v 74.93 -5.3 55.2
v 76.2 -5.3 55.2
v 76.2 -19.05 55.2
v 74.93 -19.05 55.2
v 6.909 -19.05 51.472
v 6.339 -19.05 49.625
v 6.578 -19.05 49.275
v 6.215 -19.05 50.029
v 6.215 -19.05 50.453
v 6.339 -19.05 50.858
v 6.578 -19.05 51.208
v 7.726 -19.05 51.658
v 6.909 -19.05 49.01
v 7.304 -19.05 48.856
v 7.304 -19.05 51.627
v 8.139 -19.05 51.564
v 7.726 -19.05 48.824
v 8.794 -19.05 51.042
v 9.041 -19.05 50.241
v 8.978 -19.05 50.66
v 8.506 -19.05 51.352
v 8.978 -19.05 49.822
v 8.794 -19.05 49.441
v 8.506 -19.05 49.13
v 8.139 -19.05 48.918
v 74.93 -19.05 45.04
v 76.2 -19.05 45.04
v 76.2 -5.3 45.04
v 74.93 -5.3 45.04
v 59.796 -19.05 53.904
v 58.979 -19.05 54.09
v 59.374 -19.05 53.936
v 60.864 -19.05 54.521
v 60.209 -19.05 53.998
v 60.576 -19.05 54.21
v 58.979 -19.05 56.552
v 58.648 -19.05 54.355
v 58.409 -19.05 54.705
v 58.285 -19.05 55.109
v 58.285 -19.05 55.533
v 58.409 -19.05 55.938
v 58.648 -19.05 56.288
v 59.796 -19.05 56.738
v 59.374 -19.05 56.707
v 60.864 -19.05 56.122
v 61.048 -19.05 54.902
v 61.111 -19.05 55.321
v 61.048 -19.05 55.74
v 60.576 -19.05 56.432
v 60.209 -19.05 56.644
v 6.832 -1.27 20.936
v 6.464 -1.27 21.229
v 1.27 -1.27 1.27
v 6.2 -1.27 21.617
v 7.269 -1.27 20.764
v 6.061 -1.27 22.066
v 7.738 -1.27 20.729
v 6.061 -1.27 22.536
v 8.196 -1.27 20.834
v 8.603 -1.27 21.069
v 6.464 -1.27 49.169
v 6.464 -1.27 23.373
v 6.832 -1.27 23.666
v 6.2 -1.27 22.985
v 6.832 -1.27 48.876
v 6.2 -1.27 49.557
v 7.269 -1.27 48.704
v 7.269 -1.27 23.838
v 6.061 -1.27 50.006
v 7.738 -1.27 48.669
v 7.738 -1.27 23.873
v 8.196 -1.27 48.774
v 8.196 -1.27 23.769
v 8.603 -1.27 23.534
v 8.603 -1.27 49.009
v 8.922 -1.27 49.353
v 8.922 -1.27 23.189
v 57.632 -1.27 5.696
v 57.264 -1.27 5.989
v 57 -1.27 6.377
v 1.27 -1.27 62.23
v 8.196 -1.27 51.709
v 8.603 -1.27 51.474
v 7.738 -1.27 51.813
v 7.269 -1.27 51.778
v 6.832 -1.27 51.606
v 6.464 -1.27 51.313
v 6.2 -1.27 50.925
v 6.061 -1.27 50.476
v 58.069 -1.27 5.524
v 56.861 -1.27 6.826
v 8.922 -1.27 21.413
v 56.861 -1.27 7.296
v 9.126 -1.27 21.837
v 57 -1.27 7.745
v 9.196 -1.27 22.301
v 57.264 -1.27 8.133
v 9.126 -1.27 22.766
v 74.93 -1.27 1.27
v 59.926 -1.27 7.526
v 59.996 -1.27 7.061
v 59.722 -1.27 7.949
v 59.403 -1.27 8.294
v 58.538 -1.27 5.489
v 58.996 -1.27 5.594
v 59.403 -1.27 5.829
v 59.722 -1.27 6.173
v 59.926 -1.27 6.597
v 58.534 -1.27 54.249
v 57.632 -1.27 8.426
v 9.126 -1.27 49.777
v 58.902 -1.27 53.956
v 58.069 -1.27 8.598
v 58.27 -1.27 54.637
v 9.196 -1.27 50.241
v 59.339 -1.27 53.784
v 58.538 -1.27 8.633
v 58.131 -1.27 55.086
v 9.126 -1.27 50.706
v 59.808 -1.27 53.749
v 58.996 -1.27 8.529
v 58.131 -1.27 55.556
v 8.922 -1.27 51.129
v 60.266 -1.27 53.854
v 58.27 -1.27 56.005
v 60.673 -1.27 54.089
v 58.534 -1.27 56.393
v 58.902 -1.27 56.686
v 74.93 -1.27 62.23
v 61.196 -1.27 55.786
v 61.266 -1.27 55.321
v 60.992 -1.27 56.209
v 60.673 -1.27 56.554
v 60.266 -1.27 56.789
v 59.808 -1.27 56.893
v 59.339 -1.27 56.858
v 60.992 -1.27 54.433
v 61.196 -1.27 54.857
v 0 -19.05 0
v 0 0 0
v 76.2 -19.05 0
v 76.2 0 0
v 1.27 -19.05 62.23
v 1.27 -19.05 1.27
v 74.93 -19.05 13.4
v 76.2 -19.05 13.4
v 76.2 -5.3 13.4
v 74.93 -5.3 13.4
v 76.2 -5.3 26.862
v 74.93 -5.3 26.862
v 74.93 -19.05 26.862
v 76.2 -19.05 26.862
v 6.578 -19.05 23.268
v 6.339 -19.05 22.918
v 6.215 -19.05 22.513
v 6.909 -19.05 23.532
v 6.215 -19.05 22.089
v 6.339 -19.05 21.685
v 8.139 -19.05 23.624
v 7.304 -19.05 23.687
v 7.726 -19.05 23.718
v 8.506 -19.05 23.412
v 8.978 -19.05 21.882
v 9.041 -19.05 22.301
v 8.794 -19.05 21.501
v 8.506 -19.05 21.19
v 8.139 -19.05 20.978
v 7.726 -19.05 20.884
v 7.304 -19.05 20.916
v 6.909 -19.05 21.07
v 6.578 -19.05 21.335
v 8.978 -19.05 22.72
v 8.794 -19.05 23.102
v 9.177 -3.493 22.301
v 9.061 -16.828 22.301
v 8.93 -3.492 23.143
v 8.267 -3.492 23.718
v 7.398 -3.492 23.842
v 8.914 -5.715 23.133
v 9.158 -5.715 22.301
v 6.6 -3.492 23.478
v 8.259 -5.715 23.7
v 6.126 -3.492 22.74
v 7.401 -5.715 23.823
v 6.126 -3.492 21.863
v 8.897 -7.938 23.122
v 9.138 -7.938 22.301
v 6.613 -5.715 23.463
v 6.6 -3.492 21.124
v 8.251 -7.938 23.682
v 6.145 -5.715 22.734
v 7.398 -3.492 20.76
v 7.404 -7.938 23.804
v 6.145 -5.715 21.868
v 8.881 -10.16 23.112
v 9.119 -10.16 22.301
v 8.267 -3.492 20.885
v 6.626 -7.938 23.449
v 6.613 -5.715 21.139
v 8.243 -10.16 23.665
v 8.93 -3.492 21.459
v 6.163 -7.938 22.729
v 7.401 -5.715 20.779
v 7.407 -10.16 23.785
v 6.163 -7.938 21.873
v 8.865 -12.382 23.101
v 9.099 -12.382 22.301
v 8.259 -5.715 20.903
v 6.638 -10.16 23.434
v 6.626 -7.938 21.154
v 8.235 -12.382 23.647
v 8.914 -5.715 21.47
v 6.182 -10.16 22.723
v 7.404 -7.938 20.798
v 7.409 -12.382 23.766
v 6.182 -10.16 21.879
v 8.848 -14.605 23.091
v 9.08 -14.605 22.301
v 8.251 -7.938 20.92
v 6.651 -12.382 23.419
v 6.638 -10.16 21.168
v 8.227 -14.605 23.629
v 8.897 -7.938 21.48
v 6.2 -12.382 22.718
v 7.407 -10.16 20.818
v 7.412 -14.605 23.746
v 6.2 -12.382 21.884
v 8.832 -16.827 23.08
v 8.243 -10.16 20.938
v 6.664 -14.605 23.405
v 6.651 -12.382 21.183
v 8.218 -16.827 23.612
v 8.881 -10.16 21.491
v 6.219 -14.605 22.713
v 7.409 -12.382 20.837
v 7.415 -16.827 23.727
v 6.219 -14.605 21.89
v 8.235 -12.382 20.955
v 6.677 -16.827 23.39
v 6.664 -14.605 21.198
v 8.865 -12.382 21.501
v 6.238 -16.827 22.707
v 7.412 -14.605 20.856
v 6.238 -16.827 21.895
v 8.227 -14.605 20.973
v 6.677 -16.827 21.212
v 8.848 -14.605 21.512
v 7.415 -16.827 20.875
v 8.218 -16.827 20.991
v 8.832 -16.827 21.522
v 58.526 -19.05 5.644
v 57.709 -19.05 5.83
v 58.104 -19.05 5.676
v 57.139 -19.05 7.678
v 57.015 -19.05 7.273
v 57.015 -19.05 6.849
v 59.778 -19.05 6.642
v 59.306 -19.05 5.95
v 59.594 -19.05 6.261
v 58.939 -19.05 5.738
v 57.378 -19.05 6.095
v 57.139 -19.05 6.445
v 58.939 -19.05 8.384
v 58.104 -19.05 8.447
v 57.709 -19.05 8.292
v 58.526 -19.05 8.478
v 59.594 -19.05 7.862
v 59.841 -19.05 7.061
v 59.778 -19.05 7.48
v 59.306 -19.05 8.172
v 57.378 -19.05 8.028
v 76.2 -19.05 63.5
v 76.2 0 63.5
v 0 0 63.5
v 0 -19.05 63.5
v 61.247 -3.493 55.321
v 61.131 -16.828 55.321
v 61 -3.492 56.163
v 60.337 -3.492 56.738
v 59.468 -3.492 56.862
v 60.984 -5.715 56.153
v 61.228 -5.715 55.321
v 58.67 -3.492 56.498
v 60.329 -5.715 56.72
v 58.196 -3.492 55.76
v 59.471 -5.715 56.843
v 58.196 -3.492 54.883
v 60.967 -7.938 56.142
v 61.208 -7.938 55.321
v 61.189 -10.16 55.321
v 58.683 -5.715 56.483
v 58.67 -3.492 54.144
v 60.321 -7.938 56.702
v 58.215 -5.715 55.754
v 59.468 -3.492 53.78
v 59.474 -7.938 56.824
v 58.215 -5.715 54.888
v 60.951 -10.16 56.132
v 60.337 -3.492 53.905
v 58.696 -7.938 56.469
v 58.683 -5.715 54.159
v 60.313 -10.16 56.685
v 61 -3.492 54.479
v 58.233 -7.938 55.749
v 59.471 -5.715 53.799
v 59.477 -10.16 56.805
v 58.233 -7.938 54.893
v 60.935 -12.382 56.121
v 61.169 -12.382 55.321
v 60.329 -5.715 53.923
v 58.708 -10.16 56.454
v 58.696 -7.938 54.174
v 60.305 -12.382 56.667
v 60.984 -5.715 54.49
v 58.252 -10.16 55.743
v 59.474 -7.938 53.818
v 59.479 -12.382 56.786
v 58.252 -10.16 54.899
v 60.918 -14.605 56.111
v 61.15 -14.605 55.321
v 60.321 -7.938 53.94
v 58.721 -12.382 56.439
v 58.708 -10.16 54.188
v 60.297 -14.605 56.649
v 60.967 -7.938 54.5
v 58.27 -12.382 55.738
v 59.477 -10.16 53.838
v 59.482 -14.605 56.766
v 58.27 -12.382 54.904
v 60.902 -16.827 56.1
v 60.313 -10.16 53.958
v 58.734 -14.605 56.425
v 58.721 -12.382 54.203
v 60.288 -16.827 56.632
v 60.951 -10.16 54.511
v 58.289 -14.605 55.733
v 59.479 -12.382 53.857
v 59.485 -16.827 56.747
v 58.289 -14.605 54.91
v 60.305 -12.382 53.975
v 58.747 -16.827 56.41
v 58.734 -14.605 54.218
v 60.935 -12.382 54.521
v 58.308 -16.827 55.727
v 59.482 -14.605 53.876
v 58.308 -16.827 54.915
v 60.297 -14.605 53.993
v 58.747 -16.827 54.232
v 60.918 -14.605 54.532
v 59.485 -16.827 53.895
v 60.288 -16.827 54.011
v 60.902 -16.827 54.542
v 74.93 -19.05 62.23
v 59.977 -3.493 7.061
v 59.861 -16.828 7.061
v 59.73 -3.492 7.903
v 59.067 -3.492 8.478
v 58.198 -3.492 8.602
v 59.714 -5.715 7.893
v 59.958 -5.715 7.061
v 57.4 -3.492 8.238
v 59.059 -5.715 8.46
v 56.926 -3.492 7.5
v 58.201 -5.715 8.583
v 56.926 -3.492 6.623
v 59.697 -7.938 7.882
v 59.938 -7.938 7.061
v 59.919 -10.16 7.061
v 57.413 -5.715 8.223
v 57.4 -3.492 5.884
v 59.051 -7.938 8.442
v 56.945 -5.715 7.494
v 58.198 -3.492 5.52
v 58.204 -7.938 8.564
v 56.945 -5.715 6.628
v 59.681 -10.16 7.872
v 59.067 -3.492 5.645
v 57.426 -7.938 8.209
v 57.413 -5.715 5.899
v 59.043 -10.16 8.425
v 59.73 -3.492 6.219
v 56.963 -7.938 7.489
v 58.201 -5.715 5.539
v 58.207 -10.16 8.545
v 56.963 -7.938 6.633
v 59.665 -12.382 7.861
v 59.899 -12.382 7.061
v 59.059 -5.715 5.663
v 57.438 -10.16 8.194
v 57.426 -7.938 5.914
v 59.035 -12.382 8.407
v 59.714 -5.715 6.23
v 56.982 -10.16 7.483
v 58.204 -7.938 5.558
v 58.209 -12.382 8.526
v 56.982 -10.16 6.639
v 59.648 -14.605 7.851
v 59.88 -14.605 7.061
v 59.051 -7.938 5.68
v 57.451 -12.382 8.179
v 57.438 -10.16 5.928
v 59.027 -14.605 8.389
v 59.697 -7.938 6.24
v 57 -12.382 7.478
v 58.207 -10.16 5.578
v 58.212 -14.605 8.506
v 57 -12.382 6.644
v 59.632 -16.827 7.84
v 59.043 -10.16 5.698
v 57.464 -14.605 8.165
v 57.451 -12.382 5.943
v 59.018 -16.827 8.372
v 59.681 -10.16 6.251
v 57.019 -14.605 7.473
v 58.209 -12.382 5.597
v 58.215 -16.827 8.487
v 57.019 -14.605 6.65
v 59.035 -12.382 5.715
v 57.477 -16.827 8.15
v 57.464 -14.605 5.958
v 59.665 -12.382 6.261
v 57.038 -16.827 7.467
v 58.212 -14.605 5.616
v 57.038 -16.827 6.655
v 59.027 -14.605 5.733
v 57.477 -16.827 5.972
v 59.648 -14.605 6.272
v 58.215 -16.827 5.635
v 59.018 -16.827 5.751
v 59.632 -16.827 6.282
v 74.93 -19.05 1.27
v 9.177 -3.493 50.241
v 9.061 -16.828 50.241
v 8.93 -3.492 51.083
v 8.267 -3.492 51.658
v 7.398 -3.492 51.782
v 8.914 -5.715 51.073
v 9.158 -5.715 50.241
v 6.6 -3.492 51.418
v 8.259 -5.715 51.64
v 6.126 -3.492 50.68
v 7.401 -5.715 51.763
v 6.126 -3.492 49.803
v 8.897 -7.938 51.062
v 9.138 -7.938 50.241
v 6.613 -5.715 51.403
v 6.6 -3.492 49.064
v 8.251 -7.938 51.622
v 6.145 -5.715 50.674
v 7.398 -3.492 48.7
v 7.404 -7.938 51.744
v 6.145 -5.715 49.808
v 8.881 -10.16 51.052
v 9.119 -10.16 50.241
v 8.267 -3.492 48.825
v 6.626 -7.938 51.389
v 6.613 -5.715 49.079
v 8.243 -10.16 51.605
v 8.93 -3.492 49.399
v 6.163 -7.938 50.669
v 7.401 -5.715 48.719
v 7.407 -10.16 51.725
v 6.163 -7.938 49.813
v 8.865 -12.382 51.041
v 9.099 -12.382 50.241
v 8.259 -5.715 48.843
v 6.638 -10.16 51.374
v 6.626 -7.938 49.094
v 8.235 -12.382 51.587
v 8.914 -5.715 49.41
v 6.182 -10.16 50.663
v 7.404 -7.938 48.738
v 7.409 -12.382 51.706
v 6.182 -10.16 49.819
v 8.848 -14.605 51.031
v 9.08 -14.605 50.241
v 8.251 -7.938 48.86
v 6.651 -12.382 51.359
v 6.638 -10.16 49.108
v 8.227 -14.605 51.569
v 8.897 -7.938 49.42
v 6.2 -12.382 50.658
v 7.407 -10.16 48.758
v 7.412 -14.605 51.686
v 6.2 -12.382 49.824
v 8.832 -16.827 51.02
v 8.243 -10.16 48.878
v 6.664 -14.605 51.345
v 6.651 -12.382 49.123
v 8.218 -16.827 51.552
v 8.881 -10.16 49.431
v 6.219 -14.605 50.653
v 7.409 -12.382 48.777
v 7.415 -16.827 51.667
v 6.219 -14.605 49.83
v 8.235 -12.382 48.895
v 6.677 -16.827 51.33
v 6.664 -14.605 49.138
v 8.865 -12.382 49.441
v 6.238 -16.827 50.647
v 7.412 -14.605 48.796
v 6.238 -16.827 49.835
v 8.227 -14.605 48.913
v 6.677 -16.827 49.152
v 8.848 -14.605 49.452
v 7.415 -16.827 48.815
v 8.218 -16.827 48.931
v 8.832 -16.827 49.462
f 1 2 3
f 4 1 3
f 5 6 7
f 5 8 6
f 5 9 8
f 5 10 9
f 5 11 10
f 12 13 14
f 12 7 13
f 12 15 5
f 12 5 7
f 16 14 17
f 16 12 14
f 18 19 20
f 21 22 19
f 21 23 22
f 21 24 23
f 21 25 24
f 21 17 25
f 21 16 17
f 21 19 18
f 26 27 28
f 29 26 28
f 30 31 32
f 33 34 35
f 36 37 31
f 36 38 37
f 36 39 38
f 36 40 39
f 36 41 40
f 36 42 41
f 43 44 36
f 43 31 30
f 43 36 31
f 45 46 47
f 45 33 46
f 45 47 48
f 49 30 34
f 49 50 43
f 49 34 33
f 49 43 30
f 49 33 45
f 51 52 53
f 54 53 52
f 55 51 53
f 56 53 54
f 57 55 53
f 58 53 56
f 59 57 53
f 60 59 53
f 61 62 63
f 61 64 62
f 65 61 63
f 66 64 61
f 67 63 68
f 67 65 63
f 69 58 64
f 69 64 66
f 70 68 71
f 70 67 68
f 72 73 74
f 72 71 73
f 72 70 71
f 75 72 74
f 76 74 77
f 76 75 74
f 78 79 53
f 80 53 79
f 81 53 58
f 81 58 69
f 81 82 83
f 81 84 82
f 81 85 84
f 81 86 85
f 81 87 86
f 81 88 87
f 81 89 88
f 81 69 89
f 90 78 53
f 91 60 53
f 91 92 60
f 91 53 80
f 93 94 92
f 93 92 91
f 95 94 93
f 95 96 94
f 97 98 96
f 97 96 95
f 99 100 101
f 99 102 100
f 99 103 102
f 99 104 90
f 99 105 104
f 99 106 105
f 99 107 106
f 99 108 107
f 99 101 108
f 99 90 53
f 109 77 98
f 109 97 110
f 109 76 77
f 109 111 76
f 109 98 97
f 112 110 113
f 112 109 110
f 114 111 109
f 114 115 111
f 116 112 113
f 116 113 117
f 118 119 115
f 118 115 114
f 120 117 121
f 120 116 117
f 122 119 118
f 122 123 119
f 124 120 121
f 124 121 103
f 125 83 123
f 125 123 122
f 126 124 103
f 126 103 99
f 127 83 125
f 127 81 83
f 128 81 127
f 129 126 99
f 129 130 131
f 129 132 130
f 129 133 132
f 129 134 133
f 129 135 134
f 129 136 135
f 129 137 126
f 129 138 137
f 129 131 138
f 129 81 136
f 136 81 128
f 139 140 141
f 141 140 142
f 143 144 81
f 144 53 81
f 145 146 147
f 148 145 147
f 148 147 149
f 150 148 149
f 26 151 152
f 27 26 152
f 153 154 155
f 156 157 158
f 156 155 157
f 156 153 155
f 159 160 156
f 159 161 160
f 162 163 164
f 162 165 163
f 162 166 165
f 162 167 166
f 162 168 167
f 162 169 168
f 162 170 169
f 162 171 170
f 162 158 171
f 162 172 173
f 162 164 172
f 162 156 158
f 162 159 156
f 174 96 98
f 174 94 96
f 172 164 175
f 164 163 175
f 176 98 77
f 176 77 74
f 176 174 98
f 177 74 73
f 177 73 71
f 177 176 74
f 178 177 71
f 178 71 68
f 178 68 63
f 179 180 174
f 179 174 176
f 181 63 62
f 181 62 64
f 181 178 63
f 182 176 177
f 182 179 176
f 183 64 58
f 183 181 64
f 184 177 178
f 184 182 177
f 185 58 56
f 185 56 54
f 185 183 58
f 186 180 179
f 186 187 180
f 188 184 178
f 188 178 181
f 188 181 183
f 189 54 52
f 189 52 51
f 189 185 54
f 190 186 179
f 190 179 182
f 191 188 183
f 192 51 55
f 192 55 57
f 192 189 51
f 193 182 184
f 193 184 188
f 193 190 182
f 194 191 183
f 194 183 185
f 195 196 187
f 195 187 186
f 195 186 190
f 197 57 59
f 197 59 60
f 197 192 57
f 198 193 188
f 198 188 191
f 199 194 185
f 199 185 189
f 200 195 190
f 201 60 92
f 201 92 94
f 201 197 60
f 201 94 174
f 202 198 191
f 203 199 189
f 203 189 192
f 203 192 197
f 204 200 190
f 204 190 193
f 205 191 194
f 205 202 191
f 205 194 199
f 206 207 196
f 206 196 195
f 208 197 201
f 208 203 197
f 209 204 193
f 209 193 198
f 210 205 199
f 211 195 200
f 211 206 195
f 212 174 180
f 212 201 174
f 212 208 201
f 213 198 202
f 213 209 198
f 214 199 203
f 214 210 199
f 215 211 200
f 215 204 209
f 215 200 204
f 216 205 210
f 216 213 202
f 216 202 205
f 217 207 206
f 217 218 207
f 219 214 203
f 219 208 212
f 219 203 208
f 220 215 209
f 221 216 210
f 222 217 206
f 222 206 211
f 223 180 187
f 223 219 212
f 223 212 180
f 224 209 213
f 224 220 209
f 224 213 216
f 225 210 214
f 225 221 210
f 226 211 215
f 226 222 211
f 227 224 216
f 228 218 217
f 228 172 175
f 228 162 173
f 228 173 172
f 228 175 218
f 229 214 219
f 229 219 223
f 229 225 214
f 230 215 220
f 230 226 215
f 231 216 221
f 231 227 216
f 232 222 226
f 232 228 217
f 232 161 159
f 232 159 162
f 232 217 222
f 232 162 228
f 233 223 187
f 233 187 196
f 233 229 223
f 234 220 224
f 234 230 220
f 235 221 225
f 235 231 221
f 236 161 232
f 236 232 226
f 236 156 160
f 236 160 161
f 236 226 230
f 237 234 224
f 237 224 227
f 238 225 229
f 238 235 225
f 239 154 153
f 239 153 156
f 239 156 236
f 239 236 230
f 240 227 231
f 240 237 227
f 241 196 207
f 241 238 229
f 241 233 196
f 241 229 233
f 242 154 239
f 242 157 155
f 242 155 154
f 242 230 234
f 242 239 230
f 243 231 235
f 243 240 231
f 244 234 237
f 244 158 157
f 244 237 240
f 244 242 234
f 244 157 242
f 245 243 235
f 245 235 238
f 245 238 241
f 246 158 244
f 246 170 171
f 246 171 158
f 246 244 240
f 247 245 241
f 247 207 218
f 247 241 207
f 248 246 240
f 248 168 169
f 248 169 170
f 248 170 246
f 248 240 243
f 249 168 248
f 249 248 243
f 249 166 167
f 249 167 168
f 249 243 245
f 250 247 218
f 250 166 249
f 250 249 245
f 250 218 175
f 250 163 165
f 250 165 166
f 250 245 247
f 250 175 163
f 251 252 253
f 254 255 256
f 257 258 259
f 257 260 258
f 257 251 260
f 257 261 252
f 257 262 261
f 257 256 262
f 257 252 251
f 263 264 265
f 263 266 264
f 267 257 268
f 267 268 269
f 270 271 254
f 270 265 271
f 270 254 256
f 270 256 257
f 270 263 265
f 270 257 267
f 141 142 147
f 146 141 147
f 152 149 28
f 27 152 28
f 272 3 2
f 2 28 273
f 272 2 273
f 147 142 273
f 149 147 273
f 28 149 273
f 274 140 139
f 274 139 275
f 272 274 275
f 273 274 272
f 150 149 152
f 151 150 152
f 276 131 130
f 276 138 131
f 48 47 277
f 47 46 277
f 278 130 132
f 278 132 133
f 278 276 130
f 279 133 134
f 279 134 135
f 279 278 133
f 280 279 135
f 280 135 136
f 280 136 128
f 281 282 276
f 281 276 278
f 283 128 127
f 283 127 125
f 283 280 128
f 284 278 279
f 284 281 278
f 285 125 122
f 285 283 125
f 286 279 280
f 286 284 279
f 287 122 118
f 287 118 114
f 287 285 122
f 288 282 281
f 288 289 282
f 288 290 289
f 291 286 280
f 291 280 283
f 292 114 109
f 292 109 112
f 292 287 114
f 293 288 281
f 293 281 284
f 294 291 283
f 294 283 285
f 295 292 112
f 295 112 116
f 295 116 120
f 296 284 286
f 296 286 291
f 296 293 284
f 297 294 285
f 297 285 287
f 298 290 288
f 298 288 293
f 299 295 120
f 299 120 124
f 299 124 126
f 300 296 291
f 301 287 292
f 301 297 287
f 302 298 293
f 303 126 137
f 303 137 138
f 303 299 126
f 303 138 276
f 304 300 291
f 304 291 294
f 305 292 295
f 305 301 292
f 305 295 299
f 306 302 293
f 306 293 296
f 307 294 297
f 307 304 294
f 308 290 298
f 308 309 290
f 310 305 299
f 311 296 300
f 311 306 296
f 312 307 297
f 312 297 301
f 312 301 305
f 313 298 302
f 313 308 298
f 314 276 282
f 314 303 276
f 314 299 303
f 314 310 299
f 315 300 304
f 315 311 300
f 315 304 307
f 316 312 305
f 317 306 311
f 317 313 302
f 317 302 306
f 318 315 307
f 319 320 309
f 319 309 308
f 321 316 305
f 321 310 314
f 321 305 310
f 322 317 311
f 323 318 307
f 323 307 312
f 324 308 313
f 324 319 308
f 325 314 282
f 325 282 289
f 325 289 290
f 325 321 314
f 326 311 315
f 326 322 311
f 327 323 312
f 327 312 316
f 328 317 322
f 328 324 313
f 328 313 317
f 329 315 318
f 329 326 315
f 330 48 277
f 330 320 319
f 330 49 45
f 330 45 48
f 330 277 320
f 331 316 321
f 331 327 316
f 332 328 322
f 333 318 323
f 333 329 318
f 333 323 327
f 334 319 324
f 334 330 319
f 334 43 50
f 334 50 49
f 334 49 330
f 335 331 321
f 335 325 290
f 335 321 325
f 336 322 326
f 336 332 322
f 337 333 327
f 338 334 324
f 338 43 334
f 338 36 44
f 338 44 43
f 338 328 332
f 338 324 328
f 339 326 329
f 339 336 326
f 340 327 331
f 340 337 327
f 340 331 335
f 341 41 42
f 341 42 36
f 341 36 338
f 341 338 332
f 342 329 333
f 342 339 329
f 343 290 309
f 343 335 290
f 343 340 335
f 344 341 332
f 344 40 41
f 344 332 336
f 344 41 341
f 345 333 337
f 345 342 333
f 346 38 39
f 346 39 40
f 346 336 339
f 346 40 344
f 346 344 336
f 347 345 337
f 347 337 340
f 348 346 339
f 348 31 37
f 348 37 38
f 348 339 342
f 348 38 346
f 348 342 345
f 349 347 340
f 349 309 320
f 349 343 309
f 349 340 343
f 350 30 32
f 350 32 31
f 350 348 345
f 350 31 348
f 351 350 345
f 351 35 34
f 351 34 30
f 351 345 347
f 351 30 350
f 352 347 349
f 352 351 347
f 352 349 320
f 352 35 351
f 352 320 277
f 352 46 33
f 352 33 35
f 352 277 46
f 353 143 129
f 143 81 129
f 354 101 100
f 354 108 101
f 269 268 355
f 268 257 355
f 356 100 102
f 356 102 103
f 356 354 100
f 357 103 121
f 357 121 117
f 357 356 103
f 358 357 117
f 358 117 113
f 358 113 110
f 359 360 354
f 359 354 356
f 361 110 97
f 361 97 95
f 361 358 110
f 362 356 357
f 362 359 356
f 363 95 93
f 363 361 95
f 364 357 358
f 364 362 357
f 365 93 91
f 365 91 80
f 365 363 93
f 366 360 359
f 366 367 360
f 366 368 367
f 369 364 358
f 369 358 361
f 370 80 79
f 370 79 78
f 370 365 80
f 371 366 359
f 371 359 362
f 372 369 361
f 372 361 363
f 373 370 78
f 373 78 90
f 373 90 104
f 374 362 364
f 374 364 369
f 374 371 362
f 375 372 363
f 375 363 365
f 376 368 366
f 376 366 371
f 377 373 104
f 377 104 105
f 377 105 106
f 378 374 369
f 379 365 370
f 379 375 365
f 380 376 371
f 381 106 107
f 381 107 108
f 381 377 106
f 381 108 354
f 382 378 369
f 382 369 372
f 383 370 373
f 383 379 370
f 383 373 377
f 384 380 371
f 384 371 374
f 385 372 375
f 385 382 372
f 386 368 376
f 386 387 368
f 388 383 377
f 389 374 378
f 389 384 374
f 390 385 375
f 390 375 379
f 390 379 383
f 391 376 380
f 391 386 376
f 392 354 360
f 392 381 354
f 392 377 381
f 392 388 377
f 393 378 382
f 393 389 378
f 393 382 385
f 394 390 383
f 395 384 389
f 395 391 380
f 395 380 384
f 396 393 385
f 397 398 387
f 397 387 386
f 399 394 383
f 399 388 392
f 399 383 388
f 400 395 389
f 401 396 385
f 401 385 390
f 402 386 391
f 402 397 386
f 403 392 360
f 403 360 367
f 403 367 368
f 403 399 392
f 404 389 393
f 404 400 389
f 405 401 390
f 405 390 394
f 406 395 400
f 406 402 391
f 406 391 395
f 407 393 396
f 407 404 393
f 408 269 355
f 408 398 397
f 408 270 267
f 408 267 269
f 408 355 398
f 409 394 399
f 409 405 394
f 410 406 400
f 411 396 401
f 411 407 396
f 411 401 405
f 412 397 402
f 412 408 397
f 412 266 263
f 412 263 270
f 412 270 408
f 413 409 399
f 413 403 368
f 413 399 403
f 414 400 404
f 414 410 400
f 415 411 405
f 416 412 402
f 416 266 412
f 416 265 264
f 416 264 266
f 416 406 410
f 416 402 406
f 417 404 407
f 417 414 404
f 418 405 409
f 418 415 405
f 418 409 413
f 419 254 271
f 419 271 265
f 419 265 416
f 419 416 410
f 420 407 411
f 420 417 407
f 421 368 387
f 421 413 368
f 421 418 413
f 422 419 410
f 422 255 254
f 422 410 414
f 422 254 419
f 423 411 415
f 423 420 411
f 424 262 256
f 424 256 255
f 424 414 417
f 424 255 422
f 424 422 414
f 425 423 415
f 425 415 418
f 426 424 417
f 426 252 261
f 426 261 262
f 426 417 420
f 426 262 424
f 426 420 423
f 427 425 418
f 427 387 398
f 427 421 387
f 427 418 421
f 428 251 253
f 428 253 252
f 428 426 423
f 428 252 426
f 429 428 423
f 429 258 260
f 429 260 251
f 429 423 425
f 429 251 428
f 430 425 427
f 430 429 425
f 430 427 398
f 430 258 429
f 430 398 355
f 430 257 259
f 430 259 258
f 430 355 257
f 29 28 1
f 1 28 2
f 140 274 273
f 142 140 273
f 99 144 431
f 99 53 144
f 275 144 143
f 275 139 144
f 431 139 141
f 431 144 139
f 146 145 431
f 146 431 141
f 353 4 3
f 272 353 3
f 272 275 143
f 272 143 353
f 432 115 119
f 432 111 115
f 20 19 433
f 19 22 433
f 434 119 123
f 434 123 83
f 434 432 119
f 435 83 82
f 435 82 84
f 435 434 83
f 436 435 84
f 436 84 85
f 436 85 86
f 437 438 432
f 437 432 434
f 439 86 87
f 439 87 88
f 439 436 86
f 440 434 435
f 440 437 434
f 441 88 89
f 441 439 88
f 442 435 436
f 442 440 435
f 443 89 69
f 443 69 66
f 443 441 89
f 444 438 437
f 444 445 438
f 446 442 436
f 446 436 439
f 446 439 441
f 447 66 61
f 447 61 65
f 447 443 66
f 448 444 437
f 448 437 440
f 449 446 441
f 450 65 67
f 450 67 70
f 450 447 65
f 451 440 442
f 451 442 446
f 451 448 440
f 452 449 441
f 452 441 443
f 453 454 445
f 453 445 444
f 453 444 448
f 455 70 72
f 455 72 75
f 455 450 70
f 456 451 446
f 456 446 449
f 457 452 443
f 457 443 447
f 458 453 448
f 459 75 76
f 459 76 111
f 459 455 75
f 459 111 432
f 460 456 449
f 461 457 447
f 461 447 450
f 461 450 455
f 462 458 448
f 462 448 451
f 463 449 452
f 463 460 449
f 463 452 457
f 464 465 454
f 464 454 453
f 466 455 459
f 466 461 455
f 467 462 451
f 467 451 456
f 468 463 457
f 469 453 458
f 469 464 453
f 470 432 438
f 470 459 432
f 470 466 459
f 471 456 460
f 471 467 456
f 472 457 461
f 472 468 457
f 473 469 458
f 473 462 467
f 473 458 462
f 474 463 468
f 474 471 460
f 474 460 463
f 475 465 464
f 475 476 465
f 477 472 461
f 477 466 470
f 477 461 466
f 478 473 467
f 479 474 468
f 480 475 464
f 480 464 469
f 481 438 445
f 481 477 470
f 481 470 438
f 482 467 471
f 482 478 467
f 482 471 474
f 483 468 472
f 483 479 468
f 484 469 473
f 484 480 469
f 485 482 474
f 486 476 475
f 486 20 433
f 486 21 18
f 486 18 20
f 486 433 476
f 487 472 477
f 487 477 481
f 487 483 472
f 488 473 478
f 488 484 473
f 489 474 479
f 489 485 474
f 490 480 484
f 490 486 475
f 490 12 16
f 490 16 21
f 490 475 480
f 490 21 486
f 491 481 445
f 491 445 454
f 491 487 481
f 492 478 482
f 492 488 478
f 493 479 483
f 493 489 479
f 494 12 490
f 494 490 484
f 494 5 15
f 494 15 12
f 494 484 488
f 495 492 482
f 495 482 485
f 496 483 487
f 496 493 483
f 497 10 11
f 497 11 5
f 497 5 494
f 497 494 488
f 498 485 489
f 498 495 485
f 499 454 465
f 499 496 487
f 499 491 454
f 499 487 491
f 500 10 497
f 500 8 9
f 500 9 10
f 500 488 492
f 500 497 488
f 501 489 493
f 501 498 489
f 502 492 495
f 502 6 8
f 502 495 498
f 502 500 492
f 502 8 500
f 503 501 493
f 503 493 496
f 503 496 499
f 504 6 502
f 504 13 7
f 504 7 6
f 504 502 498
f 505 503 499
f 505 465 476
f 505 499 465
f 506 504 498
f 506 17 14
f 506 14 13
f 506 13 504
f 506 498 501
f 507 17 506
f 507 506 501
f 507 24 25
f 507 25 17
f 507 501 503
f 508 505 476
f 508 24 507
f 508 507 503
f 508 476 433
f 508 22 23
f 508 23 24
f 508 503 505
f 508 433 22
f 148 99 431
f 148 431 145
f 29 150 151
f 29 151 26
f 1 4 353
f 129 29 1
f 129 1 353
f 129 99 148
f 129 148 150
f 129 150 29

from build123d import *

# Parameters (mm, degrees)
F0_W     = 76.2
F0_H     = 63.5
F1_DEPTH = 19.05
F3_T     = -1.27
F2_R     = 1.5875
F4_DEPTH = 19.05
F4_TAPER = 0.5
F5_W     = 0.22
F5_H     = 10.16
F5_W_2   = 13.75
F5_H_2   = 13.462
F6_DEPTH = 1.27


# Not quite as in the source:
# - a feature names something its author has since deleted; it is built from what else it names


with BuildPart() as f1:
    # F0 (on Front) → F1 (new body)
    with BuildSketch(Plane.XZ):
        with Locations((38.1, 31.75)):
            Rectangle(F0_W, F0_H)
    extrude(amount=F1_DEPTH)

    # F3
    f3_openings = [f1.faces().sort_by_distance(p)[0] for p in [
        (38.1, -19.05, 31.75),
    ]]
    offset(amount=F3_T, openings=f3_openings)

    # F2 (on face) → F4 (join)
    with BuildSketch(Plane.XZ):
        with Locations((59.69, 55.3212)):
            Circle(F2_R)
        with Locations((7.62, 50.2412)):
            Circle(F2_R)
        with Locations((7.62, 22.3012)):
            Circle(F2_R)
        with Locations((58.42, 7.0612)):
            Circle(F2_R)
    extrude(amount=F4_DEPTH, taper=F4_TAPER)

    # F5 (on face) → F6 (cut)
    with BuildSketch(Plane.YZ.offset(76.2)):
        with Locations((-19.16, 50.12)):
            Rectangle(F5_W, F5_H)
        with Locations((-12.175, 50.12)):
            Rectangle(F5_W_2, F5_H)
        with Locations((-19.16, 20.131)):
            Rectangle(F5_W, F5_H_2)
        with Locations((-12.175, 20.131)):
            Rectangle(F5_W_2, F5_H_2)
    extrude(amount=-F6_DEPTH, mode=Mode.SUBTRACT)


solid = f1.part
